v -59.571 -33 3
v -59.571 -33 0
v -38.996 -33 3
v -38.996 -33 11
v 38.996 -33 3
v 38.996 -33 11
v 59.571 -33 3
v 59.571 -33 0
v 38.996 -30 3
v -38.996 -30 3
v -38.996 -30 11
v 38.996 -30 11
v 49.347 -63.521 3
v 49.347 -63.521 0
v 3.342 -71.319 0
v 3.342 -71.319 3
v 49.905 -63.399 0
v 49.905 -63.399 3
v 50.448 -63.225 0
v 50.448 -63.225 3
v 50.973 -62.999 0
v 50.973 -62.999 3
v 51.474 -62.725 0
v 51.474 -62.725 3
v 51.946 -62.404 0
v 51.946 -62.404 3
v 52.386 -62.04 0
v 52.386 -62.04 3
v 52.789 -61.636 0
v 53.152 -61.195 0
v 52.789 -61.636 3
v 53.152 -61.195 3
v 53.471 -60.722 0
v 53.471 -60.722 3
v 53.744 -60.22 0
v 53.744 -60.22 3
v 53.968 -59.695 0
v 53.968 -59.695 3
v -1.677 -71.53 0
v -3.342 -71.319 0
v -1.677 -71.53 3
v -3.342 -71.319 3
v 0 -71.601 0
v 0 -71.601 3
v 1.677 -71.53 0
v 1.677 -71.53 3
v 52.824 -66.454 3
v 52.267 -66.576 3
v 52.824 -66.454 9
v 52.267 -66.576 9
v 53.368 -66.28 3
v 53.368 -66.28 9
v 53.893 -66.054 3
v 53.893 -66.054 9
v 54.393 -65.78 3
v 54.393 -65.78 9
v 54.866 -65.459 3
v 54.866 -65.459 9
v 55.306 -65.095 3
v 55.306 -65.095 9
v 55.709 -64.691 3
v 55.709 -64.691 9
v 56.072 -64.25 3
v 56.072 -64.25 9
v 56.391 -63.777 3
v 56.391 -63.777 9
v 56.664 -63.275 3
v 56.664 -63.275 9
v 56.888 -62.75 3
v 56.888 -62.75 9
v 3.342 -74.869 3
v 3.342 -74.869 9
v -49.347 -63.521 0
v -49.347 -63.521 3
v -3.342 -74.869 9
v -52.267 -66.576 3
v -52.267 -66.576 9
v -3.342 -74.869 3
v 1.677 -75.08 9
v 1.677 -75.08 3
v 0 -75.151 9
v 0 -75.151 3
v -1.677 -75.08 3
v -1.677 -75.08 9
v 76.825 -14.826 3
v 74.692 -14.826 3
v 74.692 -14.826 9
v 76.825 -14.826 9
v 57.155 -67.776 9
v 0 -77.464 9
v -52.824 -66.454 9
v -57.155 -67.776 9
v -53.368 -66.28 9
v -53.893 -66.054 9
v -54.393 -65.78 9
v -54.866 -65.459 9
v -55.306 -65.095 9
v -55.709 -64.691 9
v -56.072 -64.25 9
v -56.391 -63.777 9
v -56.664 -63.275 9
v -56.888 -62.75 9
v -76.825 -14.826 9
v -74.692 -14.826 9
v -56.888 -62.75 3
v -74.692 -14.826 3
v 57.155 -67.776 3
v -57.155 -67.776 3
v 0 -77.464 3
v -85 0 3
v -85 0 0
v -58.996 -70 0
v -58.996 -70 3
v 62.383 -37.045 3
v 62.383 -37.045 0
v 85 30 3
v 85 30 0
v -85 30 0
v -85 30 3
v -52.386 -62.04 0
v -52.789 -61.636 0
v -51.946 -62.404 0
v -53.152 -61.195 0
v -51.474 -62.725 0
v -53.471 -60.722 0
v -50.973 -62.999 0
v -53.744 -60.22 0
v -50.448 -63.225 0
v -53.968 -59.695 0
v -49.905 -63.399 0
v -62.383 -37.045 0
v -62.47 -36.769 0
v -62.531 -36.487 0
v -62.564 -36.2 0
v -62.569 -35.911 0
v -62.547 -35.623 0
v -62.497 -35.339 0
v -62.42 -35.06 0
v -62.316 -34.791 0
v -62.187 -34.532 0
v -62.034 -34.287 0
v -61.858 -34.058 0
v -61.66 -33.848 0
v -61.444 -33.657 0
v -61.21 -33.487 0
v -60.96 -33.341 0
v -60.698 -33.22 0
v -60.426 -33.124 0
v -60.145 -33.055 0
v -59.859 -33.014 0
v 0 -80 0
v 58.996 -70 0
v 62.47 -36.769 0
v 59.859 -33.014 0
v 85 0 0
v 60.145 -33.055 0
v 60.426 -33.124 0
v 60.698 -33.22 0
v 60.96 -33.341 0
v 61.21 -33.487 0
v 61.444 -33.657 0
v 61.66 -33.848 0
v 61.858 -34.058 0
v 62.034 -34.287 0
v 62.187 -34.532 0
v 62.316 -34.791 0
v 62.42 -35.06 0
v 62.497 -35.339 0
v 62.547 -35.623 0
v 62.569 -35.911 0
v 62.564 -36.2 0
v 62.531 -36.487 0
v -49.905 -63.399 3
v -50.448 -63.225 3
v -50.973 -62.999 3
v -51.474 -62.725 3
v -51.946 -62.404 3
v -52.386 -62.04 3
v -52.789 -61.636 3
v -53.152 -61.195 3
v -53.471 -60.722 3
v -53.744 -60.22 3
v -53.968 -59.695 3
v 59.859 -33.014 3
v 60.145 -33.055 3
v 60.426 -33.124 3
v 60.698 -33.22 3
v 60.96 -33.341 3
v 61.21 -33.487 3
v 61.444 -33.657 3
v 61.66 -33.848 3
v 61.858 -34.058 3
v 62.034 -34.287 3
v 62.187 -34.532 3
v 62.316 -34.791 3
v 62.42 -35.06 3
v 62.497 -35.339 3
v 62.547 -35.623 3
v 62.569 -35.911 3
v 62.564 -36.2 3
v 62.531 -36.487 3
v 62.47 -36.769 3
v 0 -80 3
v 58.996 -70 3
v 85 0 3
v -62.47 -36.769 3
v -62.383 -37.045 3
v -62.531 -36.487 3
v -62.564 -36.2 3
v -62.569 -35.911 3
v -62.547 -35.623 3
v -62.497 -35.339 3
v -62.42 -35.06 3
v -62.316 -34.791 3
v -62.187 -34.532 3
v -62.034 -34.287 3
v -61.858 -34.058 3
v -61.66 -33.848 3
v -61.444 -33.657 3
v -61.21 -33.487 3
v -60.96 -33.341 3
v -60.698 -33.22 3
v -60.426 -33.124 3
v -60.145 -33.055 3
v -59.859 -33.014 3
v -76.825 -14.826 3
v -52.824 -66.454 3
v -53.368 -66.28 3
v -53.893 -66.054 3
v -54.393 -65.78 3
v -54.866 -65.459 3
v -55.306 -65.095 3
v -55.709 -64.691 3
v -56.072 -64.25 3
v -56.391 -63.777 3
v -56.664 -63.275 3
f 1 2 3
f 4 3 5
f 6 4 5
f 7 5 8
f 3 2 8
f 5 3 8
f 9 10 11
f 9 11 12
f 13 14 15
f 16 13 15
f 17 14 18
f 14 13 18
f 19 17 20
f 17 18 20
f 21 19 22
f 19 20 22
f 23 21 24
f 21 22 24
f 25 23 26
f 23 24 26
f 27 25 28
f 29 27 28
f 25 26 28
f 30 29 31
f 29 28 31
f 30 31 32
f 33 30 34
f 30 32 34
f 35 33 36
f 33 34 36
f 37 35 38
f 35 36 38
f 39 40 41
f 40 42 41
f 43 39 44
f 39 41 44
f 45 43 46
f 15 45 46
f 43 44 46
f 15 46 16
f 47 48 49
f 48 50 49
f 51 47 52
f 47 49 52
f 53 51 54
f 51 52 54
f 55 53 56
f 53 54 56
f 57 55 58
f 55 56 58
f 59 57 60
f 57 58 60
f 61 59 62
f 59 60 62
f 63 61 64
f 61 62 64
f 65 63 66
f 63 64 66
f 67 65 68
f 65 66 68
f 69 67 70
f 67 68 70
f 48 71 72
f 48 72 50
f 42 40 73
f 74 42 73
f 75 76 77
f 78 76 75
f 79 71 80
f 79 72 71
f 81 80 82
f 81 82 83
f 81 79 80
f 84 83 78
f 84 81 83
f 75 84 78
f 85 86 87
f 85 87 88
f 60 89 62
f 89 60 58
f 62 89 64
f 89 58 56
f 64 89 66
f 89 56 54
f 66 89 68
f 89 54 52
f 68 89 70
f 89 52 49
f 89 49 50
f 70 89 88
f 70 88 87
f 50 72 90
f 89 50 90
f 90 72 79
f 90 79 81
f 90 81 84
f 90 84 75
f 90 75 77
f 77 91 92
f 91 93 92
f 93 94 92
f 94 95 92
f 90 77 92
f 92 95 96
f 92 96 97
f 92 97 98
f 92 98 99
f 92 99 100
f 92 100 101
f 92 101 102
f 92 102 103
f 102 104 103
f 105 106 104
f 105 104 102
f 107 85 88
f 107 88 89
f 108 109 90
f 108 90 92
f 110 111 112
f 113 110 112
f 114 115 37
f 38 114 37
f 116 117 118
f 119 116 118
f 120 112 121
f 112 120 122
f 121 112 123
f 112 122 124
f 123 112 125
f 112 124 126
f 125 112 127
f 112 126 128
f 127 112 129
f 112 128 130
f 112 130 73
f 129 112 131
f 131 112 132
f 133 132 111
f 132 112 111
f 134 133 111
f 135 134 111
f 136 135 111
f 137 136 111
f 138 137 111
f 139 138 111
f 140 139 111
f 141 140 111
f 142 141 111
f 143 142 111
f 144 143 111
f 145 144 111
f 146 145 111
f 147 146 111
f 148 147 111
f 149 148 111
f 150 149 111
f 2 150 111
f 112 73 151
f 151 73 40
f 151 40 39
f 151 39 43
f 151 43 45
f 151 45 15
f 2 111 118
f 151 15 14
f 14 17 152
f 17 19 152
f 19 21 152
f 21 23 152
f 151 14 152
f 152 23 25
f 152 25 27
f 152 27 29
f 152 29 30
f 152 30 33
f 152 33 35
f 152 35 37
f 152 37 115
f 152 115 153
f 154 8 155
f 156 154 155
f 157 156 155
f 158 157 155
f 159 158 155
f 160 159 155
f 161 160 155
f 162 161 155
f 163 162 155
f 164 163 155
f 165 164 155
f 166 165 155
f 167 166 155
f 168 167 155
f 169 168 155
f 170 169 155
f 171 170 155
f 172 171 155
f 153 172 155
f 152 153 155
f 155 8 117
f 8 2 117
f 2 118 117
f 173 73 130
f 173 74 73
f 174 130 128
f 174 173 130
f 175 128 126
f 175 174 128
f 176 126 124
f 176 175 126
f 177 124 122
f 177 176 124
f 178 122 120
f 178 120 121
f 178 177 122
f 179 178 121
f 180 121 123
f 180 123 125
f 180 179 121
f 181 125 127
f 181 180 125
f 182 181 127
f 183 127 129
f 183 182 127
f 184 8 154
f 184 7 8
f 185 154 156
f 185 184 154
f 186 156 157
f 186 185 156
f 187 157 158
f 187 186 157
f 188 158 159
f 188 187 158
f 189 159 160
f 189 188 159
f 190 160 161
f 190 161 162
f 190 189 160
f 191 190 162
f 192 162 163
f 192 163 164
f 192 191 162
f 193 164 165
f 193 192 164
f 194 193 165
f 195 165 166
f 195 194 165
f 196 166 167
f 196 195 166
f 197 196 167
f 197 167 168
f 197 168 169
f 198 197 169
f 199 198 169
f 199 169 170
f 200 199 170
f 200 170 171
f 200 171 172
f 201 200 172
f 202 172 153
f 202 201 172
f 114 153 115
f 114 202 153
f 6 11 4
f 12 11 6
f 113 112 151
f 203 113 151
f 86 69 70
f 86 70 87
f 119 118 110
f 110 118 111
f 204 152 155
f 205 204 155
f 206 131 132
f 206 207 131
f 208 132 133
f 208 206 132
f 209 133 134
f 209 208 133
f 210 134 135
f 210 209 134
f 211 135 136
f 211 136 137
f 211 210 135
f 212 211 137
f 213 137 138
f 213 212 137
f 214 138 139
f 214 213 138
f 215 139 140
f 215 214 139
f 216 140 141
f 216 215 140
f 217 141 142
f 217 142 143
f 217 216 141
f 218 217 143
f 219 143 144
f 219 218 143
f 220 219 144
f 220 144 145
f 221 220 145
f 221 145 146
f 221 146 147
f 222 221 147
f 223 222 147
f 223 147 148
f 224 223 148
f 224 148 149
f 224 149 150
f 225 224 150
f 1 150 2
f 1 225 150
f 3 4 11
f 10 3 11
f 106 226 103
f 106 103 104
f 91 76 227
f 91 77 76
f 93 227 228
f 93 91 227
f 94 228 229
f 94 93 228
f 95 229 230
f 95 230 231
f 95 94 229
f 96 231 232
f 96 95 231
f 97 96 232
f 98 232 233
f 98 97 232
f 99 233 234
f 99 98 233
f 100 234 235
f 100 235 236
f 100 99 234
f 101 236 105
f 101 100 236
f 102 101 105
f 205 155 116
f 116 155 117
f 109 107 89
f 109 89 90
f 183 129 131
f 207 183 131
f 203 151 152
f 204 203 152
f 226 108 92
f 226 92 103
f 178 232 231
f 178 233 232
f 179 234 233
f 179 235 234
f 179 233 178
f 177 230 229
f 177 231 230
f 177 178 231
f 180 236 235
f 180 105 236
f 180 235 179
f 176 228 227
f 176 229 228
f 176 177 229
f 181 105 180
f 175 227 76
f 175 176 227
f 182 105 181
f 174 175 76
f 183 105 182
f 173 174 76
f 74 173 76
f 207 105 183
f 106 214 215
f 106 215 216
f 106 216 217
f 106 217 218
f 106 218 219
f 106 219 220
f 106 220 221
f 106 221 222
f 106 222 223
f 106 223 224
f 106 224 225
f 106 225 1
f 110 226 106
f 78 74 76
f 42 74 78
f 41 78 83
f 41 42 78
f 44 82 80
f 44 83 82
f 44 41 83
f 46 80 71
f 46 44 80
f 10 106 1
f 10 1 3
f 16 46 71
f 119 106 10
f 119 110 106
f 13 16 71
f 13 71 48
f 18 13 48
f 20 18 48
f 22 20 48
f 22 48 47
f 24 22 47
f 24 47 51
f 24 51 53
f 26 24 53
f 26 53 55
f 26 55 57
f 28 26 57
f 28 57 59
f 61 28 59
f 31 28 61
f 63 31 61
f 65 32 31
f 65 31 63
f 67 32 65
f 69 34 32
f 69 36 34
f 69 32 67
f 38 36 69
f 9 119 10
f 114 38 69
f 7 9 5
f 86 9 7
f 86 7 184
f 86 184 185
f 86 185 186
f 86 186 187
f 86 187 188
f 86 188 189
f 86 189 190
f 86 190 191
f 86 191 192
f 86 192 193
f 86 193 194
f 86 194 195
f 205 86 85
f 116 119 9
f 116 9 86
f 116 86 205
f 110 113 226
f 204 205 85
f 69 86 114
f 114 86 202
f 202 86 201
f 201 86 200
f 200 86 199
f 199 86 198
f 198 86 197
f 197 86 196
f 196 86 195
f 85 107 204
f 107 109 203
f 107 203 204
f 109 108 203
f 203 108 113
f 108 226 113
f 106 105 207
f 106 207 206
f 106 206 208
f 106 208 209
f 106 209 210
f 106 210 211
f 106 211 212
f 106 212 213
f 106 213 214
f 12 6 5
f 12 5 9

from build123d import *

# Parameters (mm, degrees)
BOSS_EXTRUDE1_DEPTH = 3
BOSS_EXTRUDE2_DEPTH = 6
FILLET1_R           = 20
FILLET2_R           = 6
FILLET4_R           = 3
SKETCH4_W           = 77.991272398
SKETCH4_H           = 3
BOSS_EXTRUDE3_DEPTH = 8


with BuildPart() as part:
    # Sketch2 → Boss-Extrude1 (new body)
    with BuildSketch(Plane.XY):
        Polygon((85, 0), (85, 30), (-85, 30), (-85, 0), (-58.995636199, -70), (0, -80), (58.995636199, -70), align=None)
        Polygon((63.885527266, -33), (52.762165892, -62.942485887), (0, -71.885887347), (-52.762165892, -62.942485887), (-63.885527266, -33), align=None, mode=Mode.SUBTRACT)
    extrude(amount=BOSS_EXTRUDE1_DEPTH)

    # Sketch3 → Boss-Extrude2 (add)
    with BuildSketch(Plane.XY.offset(3)):
        Polygon((-74.691839611, -14.825881059), (-55.682056872, -65.99747679), (0, -75.435811633), (55.682056872, -65.99747679), (74.691839611, -14.825881059), (76.82538642, -14.825881059), (57.154758795, -67.776375994), (0, -77.464339796), (-57.154758795, -67.776375994), (-76.82538642, -14.825881059), align=None)
    extrude(amount=BOSS_EXTRUDE2_DEPTH)

    # Fillet1
    fillet1_edges = [part.edges().sort_by_distance(p)[0] for p in [
        (0, -71.885887347, 1.5),
        (0, -75.435811633, 6),
    ]]
    fillet(fillet1_edges, radius=FILLET1_R)

    # Fillet2
    fillet2_edges = [part.edges().sort_by_distance(p)[0] for p in [
        (-52.762165892, -62.942485887, 1.5),
        (52.762165892, -62.942485887, 1.5),
        (55.682056872, -65.99747679, 6),
        (-55.682056872, -65.99747679, 6),
    ]]
    fillet(fillet2_edges, radius=FILLET2_R)

    # Fillet4
    fillet4_edges = [part.edges().sort_by_distance(p)[0] for p in [
        (63.885527266, -33, 1.5),
        (-63.885527266, -33, 1.5),
    ]]
    fillet(fillet4_edges, radius=FILLET4_R)

    # Sketch4 → Boss-Extrude3 (add)
    with BuildSketch(Plane.XY.offset(3)):
        with Locations((0, -31.5)):
            Rectangle(SKETCH4_W, SKETCH4_H)
    extrude(amount=BOSS_EXTRUDE3_DEPTH)


solid = part.part
